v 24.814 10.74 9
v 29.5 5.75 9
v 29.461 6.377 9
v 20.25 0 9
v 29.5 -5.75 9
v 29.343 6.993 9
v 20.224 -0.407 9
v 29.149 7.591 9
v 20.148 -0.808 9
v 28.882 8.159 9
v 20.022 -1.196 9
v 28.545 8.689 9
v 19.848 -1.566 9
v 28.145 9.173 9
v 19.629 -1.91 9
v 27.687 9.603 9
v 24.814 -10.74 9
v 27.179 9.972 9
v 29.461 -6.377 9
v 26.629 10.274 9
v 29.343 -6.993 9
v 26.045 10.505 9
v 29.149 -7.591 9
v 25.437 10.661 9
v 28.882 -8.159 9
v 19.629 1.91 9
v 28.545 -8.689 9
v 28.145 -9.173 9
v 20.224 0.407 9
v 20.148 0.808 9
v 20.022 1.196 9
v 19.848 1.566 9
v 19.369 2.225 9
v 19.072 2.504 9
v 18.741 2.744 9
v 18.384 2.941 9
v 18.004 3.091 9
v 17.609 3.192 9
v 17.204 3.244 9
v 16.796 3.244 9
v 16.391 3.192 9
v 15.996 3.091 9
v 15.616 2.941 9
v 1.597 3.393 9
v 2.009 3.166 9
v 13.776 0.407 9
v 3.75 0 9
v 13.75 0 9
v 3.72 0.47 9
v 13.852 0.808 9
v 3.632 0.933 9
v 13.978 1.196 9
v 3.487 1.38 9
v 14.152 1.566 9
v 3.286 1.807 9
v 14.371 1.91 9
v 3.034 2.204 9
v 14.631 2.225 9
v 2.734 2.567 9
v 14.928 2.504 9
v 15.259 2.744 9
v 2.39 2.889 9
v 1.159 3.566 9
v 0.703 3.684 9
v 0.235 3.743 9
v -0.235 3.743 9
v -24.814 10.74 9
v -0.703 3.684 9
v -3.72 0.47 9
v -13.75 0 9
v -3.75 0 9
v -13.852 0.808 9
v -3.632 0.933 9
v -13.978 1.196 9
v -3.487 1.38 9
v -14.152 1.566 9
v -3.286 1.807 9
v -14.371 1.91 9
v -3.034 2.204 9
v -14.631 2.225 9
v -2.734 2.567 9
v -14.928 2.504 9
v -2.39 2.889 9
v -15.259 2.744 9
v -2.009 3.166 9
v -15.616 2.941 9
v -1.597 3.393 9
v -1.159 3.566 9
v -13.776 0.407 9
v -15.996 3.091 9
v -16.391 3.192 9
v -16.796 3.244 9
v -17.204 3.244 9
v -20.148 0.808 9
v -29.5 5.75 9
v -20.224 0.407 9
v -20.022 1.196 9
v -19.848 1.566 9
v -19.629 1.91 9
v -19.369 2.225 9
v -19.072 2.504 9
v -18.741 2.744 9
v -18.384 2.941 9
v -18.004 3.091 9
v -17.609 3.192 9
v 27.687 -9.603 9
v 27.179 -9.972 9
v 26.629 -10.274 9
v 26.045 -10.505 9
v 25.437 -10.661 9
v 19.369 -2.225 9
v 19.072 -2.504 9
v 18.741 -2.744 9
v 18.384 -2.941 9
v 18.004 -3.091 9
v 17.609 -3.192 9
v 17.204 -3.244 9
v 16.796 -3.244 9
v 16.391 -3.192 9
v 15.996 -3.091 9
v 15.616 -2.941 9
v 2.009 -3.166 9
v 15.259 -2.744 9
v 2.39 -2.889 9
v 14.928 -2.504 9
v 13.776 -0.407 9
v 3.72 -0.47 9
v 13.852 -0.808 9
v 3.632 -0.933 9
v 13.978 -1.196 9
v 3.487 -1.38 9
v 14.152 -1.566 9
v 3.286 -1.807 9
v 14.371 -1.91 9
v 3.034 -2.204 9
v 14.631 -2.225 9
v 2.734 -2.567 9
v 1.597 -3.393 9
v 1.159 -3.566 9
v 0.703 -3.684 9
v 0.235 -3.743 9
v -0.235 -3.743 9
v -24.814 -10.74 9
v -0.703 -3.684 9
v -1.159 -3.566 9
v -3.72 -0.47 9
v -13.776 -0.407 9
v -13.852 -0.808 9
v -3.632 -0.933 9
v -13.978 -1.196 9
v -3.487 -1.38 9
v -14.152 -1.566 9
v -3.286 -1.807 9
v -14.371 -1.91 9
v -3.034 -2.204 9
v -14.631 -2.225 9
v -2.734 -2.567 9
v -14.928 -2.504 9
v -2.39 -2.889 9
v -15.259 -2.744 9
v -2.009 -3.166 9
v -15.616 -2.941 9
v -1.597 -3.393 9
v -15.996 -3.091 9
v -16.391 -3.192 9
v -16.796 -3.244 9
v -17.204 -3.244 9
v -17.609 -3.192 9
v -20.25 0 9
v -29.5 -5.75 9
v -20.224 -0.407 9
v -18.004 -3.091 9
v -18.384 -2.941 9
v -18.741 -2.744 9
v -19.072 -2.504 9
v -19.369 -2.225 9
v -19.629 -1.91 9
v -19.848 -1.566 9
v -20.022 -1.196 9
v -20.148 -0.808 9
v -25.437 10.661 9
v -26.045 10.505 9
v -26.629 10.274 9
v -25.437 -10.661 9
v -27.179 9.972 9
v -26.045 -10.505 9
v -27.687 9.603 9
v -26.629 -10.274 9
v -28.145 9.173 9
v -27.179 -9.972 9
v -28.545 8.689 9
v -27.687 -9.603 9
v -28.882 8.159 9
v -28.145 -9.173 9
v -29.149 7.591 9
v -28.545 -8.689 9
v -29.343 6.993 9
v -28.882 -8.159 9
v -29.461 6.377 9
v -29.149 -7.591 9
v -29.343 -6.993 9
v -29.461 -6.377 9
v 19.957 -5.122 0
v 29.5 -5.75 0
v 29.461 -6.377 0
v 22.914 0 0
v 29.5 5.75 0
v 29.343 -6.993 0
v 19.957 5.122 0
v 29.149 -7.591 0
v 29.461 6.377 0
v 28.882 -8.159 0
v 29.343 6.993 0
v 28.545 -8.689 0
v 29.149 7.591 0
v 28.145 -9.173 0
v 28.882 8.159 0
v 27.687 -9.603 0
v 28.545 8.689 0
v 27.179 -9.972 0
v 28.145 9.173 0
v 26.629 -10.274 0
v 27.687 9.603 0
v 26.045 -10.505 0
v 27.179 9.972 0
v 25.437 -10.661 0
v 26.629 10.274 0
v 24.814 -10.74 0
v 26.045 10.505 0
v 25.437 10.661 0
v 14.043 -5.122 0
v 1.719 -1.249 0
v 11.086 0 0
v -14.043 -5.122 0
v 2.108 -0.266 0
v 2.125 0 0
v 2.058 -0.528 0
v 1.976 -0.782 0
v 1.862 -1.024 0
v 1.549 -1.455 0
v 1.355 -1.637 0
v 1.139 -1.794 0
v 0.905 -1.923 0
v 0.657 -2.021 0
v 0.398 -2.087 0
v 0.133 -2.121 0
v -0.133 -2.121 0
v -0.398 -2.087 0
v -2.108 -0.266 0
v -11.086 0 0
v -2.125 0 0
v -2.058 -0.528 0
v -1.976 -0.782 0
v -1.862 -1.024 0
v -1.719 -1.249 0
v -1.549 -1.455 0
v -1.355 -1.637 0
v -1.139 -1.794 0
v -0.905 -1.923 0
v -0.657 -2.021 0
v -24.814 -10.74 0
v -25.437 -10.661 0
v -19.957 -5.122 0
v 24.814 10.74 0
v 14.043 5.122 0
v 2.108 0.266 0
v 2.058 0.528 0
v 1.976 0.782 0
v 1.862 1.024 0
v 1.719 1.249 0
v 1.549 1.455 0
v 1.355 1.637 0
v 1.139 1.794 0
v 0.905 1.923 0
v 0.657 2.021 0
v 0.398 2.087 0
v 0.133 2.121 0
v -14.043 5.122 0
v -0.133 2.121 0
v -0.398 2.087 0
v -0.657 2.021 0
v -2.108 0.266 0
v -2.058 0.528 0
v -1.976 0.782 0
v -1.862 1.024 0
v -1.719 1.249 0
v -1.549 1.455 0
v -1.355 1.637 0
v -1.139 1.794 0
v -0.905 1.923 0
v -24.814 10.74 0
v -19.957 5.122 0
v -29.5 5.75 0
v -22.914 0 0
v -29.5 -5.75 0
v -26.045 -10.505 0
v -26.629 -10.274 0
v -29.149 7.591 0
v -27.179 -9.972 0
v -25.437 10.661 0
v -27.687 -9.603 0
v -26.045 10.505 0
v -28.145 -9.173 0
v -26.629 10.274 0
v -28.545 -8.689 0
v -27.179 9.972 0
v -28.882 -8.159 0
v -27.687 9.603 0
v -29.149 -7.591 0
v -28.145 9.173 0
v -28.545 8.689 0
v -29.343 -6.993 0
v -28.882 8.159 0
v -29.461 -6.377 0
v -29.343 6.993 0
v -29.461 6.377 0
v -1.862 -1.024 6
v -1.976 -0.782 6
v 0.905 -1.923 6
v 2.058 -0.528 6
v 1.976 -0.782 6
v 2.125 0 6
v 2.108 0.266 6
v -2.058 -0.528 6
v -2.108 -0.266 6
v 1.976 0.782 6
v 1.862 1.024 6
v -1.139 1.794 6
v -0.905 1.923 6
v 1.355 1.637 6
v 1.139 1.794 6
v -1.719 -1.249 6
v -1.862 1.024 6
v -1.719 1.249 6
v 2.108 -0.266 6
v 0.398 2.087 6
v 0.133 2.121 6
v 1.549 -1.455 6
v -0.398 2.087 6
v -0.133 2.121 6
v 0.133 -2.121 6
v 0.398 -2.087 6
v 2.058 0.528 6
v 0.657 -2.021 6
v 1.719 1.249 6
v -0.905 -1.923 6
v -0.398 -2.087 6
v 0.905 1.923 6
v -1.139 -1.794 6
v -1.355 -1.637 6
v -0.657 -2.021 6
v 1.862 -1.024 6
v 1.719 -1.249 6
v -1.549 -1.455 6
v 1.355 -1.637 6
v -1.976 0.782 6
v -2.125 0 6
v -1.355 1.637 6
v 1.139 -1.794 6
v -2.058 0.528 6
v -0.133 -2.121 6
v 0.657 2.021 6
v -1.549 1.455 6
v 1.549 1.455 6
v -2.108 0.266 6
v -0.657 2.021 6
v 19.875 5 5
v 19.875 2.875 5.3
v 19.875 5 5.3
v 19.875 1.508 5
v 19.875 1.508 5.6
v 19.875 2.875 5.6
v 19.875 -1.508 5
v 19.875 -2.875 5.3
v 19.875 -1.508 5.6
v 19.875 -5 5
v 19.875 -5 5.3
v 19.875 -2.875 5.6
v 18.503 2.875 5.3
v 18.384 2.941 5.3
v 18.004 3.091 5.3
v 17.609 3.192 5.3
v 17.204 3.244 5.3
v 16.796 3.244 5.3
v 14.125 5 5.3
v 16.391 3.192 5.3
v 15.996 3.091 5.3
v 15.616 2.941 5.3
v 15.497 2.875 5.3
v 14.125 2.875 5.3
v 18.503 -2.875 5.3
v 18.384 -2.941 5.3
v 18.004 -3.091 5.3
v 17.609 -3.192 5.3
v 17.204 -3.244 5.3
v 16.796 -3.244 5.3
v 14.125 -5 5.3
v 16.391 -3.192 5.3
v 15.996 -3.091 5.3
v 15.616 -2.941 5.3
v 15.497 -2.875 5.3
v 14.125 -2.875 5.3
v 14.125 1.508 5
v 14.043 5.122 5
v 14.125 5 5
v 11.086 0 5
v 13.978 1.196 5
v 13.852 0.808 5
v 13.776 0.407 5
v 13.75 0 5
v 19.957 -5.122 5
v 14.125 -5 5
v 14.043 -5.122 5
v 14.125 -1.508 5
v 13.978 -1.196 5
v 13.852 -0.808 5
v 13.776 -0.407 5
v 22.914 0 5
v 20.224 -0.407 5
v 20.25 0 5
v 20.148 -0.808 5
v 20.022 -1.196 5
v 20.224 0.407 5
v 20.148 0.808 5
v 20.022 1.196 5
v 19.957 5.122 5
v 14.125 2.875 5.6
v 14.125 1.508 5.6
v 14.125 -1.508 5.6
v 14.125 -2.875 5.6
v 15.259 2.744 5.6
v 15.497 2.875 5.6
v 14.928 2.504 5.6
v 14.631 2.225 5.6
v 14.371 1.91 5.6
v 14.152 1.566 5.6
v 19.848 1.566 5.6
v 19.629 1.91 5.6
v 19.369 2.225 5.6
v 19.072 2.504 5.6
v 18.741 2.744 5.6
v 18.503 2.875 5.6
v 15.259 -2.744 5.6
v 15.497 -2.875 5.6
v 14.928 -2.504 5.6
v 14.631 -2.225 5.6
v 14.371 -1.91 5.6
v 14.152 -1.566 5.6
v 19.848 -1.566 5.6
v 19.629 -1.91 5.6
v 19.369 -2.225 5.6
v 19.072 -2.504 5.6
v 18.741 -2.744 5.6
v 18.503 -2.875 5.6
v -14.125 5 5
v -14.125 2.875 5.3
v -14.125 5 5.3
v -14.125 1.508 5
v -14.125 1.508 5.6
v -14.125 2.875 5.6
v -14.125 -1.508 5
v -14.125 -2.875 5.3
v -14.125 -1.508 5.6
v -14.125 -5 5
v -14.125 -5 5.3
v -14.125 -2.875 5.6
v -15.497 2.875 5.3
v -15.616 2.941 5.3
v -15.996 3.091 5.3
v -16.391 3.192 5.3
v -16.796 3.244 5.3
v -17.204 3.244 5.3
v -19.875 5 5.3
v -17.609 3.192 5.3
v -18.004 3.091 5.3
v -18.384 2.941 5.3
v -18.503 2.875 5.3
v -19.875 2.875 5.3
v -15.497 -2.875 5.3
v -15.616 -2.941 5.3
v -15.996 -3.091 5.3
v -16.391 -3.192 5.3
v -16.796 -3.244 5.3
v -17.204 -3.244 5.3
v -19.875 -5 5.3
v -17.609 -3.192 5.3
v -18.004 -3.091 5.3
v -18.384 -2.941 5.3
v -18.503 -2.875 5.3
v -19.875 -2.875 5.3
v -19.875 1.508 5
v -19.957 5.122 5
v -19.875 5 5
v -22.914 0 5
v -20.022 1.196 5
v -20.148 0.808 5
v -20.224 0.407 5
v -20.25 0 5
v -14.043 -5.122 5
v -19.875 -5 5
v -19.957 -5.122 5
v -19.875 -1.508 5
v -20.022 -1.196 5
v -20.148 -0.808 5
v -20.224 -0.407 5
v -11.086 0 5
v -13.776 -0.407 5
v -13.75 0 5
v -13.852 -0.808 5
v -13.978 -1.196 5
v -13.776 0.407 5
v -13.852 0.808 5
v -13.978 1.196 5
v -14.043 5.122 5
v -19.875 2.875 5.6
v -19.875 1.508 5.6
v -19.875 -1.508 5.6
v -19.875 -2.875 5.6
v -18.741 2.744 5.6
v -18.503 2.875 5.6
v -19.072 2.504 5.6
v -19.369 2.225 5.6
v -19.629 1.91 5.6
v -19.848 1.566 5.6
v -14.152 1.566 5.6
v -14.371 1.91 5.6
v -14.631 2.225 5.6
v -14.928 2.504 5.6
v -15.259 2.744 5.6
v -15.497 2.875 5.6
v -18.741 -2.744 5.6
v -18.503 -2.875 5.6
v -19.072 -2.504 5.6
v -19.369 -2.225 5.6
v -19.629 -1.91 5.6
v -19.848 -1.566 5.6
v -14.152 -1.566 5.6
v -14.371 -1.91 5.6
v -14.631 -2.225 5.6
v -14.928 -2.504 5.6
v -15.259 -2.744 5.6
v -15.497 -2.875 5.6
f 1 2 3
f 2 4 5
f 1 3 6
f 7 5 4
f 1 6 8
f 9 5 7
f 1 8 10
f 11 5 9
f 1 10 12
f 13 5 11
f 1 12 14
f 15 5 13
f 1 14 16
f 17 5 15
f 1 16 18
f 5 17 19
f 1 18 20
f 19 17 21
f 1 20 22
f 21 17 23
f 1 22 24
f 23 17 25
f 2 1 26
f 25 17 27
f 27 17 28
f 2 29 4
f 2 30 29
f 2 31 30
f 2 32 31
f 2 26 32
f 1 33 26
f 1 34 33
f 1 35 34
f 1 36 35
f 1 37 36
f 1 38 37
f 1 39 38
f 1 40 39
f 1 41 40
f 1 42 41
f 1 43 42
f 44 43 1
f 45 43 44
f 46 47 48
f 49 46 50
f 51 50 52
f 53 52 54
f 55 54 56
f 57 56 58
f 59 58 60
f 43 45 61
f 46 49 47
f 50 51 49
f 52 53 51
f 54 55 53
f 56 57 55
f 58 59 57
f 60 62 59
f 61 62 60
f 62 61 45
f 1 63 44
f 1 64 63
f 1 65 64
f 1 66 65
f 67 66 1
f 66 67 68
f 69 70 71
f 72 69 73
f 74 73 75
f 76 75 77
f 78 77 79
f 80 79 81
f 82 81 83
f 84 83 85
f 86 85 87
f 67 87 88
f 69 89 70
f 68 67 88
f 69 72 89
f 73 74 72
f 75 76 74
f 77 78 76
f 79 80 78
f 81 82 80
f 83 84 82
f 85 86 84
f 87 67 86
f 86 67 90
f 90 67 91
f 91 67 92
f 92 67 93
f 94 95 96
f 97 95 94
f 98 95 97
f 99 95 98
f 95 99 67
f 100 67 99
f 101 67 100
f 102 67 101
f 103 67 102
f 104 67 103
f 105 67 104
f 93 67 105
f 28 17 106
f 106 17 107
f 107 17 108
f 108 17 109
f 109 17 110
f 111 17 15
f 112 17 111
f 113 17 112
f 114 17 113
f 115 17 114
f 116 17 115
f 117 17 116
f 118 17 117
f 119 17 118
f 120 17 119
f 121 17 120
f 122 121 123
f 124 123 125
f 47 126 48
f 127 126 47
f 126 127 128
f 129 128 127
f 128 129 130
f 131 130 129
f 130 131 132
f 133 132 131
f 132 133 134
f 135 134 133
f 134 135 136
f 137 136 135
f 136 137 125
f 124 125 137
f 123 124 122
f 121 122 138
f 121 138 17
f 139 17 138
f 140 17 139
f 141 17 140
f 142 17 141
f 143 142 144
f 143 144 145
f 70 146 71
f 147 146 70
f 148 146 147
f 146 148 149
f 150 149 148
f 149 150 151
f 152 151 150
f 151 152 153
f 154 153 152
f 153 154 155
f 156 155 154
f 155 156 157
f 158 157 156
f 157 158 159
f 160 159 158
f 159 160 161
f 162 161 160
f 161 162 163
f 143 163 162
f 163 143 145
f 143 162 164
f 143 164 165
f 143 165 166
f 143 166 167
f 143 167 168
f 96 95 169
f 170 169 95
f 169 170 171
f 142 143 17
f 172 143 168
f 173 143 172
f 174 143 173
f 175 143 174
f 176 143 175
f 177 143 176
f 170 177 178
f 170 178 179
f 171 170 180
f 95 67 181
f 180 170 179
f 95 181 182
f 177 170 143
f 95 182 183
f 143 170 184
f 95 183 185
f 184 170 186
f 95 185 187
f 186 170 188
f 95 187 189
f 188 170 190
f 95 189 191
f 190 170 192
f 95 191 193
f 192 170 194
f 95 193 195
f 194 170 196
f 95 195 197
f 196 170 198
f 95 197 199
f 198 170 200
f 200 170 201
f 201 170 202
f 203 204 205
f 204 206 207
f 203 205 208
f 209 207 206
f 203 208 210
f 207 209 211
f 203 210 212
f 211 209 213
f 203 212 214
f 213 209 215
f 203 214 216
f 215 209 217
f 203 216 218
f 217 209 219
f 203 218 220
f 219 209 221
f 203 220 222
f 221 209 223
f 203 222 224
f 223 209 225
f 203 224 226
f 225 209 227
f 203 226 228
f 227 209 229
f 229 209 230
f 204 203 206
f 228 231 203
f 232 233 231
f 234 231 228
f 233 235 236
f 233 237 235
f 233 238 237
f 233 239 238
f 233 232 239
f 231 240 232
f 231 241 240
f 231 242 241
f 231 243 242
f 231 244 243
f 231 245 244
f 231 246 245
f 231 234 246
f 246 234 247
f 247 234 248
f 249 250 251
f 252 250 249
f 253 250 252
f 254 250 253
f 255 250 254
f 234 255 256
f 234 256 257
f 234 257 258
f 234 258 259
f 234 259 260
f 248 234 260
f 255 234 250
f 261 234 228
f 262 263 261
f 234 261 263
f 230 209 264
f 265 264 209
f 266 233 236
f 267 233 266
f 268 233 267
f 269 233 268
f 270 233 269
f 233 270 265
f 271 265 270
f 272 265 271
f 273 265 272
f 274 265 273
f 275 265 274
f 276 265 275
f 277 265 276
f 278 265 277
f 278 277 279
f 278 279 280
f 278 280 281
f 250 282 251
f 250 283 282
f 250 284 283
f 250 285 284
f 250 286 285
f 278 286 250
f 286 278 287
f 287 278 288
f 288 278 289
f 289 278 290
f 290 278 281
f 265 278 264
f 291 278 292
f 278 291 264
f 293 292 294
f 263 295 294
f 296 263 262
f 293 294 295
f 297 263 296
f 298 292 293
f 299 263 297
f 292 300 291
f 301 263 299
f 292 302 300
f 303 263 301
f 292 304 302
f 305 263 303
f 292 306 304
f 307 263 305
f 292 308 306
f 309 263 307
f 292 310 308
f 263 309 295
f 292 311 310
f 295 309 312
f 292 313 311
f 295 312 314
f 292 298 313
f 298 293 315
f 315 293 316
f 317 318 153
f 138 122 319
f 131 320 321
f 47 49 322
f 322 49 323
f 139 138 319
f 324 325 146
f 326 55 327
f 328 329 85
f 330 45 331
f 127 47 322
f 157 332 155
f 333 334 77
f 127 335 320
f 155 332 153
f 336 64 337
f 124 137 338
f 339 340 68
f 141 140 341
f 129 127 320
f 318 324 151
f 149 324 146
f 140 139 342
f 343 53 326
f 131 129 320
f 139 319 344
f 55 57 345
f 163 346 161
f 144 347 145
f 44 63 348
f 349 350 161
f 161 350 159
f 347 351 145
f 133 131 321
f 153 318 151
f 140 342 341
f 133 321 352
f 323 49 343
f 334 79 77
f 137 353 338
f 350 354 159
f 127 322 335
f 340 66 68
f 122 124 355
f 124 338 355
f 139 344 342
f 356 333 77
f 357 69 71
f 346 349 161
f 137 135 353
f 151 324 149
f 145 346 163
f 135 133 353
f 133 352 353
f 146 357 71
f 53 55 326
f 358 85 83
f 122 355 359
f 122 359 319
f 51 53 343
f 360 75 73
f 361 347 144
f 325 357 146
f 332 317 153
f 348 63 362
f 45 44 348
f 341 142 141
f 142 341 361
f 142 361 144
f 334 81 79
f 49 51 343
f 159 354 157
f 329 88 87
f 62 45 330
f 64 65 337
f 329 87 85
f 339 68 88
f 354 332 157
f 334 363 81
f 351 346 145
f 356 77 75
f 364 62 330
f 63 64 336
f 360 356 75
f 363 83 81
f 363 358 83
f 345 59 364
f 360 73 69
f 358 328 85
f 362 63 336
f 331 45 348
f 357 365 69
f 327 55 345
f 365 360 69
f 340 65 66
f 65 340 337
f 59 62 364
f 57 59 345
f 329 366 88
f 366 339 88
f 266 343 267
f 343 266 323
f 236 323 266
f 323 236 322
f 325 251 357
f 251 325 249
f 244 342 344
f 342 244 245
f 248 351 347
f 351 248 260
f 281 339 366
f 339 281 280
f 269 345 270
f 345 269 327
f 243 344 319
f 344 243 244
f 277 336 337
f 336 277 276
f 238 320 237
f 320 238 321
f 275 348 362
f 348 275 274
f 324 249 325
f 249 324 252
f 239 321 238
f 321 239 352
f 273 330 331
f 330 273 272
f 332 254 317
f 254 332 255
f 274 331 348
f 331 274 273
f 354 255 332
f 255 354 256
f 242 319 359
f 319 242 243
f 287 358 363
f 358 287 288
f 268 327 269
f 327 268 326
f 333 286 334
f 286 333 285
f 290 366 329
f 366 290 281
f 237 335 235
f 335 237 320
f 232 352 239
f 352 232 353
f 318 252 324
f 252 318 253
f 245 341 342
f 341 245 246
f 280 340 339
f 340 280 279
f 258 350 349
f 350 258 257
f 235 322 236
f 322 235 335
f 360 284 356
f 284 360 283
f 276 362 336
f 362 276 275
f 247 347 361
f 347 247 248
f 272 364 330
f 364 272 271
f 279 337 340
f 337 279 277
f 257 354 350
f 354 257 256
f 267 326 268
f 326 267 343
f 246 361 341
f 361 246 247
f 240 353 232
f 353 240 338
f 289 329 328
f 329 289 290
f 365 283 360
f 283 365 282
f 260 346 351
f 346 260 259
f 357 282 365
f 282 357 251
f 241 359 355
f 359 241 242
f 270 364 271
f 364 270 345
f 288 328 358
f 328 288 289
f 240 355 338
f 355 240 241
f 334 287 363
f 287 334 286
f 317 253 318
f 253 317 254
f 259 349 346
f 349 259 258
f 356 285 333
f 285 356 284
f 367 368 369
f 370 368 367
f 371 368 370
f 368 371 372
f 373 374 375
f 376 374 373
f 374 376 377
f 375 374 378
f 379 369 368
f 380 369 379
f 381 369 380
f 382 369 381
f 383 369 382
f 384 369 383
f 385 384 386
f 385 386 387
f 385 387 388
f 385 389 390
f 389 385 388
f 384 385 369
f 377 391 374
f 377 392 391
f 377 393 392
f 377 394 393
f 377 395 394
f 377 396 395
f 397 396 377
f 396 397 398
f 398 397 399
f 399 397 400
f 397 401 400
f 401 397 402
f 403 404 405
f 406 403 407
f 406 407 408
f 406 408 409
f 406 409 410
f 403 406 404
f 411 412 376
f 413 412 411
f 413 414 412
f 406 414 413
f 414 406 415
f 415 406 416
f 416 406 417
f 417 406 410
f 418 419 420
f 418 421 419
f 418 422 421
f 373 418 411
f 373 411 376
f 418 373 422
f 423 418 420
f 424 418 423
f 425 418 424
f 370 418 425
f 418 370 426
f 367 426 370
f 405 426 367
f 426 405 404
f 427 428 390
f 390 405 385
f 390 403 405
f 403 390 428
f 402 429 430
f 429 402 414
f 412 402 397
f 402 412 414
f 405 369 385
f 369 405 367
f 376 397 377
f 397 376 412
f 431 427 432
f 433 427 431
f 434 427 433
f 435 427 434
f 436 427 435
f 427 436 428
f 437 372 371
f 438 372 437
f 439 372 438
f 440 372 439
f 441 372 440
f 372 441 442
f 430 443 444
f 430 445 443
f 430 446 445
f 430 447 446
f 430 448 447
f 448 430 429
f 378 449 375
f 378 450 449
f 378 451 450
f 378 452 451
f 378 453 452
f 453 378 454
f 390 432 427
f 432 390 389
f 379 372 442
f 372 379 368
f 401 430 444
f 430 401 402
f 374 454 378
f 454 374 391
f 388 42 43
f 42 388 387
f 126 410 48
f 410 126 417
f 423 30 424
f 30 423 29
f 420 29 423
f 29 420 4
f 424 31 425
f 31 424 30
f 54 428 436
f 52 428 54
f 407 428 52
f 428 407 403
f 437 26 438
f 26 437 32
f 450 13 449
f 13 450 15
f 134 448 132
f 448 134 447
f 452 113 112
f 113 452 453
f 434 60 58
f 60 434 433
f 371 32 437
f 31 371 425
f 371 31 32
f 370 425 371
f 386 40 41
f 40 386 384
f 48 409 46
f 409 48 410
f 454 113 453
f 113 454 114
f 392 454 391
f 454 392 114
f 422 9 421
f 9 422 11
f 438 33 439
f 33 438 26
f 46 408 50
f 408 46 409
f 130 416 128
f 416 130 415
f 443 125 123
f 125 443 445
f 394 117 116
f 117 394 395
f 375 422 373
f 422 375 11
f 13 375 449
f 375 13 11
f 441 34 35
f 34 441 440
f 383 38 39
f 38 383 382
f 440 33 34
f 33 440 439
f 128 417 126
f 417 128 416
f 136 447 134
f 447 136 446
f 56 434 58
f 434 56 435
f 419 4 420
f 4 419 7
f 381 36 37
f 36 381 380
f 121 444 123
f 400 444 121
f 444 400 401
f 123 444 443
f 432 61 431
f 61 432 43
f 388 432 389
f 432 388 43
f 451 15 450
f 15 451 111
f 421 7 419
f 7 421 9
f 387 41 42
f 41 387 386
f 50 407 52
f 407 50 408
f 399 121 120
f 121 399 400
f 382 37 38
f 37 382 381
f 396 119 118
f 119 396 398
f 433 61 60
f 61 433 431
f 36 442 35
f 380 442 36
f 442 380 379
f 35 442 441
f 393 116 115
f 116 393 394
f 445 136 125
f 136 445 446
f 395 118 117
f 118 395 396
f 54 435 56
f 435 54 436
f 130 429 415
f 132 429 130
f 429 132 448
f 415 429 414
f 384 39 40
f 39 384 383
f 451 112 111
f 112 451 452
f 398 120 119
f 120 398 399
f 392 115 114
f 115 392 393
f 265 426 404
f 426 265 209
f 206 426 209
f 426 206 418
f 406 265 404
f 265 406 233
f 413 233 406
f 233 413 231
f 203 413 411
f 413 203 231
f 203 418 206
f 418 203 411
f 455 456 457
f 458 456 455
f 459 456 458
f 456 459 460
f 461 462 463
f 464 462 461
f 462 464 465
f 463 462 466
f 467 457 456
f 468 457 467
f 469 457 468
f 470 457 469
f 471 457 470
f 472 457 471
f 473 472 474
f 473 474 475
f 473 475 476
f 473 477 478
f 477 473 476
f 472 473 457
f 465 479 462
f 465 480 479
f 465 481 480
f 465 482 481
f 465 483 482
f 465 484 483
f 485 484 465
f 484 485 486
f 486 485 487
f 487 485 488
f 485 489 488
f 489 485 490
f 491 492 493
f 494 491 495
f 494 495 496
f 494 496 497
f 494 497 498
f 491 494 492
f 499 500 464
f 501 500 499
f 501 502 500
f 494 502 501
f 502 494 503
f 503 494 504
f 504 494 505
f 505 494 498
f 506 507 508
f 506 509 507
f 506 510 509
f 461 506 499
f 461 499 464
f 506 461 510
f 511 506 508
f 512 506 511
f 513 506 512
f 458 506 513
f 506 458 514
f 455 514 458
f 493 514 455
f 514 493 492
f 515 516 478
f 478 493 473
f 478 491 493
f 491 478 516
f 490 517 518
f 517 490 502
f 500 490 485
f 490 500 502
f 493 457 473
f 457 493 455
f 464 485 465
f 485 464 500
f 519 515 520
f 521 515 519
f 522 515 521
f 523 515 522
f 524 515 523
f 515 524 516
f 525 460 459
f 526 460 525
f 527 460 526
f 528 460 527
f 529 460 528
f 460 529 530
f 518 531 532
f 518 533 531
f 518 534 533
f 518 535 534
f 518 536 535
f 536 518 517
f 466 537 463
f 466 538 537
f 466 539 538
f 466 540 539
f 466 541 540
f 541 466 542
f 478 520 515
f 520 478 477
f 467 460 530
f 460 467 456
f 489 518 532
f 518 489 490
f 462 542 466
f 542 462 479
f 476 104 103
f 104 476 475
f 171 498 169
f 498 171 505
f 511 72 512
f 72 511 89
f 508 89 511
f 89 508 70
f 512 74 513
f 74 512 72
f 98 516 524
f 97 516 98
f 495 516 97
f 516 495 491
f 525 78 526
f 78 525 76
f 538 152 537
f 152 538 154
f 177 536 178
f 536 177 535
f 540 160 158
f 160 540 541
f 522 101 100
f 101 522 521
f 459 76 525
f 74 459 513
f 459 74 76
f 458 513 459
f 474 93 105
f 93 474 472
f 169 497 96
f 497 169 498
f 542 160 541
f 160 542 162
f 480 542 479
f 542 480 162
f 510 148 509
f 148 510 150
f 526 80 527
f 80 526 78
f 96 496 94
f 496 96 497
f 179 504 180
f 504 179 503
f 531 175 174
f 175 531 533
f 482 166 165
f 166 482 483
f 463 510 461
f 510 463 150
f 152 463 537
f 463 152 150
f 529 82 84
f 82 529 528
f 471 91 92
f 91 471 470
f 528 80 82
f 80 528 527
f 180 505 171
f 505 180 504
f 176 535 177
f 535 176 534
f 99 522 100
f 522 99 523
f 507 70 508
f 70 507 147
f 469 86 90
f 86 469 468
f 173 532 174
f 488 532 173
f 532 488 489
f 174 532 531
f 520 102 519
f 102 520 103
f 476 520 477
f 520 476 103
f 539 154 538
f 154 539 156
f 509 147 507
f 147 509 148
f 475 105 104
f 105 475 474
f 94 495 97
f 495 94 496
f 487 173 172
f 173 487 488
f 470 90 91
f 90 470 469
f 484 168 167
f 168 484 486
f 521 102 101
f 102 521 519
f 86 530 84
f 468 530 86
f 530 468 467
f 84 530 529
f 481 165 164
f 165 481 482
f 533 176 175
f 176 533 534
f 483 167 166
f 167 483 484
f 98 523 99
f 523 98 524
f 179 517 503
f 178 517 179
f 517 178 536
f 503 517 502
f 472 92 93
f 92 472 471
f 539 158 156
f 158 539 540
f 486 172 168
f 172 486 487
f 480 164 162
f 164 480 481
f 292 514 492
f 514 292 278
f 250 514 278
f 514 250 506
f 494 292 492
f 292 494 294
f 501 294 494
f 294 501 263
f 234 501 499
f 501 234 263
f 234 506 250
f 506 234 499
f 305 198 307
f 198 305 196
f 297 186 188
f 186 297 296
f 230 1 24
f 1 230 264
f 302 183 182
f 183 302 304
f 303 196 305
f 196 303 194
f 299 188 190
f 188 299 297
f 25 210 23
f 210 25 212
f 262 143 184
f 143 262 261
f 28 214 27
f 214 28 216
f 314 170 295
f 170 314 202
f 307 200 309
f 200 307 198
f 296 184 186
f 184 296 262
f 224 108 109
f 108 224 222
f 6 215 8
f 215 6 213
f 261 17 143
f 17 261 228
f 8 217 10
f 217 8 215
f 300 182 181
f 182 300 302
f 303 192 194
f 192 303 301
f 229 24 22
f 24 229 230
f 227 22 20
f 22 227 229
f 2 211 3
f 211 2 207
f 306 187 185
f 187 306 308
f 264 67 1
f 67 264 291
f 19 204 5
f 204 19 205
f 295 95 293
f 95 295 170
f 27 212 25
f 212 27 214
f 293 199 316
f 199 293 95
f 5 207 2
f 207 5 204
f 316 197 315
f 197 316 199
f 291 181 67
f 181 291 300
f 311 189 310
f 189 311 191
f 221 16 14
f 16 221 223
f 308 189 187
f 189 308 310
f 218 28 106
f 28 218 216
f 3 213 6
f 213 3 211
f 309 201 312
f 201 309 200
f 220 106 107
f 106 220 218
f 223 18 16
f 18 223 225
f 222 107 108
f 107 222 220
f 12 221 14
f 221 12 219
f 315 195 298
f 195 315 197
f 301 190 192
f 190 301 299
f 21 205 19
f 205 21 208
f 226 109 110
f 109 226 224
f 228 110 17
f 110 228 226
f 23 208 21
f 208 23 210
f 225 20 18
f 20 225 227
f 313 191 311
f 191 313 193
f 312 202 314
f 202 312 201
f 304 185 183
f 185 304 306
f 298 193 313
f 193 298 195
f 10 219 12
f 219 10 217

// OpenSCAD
$fn = 50;


difference() {
	union() {
		hull() {
			translate(v = [-24.5000000000, 5.7500000000, 0]) {
				cylinder(h = 9, r = 5);
			}
			translate(v = [24.5000000000, 5.7500000000, 0]) {
				cylinder(h = 9, r = 5);
			}
			translate(v = [-24.5000000000, -5.7500000000, 0]) {
				cylinder(h = 9, r = 5);
			}
			translate(v = [24.5000000000, -5.7500000000, 0]) {
				cylinder(h = 9, r = 5);
			}
		}
	}
	union() {
		translate(v = [0, 0, 9]) {
			rotate(a = [0, 0, 0]) {
				difference() {
					union() {
						#translate(v = [0, 0, -9.0000000000]) {
							cylinder(h = 9, r = 2.0000000000);
						}
						#translate(v = [0, 0, -3]) {
							cylinder(h = 3, r1 = 2.1250000000, r2 = 3.7500000000);
						}
						#translate(v = [0, 0, -9.0000000000]) {
							cylinder(h = 9, r = 2.1250000000);
						}
						#translate(v = [0, 0, -9.0000000000]) {
							cylinder(h = 9, r = 2.0000000000);
						}
					}
					union();
				}
			}
		}
		translate(v = [17.0000000000, 0, 0]) {
			rotate(a = [0, 0, 0]) {
				difference() {
					union() {
						#translate(v = [-2.8750000000, -5.0000000000, -0.3000000000]) {
							cube(size = [5.7500000000, 10, 0.3000000000]);
						}
						#translate(v = [-2.8750000000, -2.8750000000, -0.6000000000]) {
							cube(size = [5.7500000000, 5.7500000000, 0.3000000000]);
						}
						#translate(v = [-2.8750000000, -5.0000000000, 5]) {
							cube(size = [5.7500000000, 10, 0.3000000000]);
						}
						#translate(v = [-2.8750000000, -2.8750000000, 5.3000000000]) {
							cube(size = [5.7500000000, 5.7500000000, 0.3000000000]);
						}
						#translate(v = [0, 0, -100.0000000000]) {
							cylinder(h = 200, r = 3.2500000000);
						}
						#linear_extrude(height = 5) {
							polygon(points = [[5.9142500000, 0.0000000000], [2.9571250000, 5.1218907443], [-2.9571250000, 5.1218907443], [-5.9142500000, 0.0000000000], [-2.9571250000, -5.1218907443], [2.9571250000, -5.1218907443]]);
						}
						#translate(v = [-2.8750000000, -5.0000000000, -0.3000000000]) {
							cube(size = [5.7500000000, 10, 0.3000000000]);
						}
						#translate(v = [-2.8750000000, -2.8750000000, -0.6000000000]) {
							cube(size = [5.7500000000, 5.7500000000, 0.3000000000]);
						}
						#translate(v = [-2.8750000000, -5.0000000000, 5]) {
							cube(size = [5.7500000000, 10, 0.3000000000]);
						}
						#translate(v = [-2.8750000000, -2.8750000000, 5.3000000000]) {
							cube(size = [5.7500000000, 5.7500000000, 0.3000000000]);
						}
						#translate(v = [0, 0, -100.0000000000]) {
							cylinder(h = 200, r = 3.2500000000);
						}
						#translate(v = [-2.8750000000, -5.0000000000, -0.3000000000]) {
							cube(size = [5.7500000000, 10, 0.3000000000]);
						}
						#translate(v = [-2.8750000000, -2.8750000000, -0.6000000000]) {
							cube(size = [5.7500000000, 5.7500000000, 0.3000000000]);
						}
						#translate(v = [-2.8750000000, -5.0000000000, 5]) {
							cube(size = [5.7500000000, 10, 0.3000000000]);
						}
						#translate(v = [-2.8750000000, -2.8750000000, 5.3000000000]) {
							cube(size = [5.7500000000, 5.7500000000, 0.3000000000]);
						}
						#translate(v = [0, 0, -100.0000000000]) {
							cylinder(h = 200, r = 3.2500000000);
						}
					}
					union();
				}
			}
		}
		translate(v = [-17.0000000000, 0, 0]) {
			rotate(a = [0, 0, 0]) {
				difference() {
					union() {
						#translate(v = [-2.8750000000, -5.0000000000, -0.3000000000]) {
							cube(size = [5.7500000000, 10, 0.3000000000]);
						}
						#translate(v = [-2.8750000000, -2.8750000000, -0.6000000000]) {
							cube(size = [5.7500000000, 5.7500000000, 0.3000000000]);
						}
						#translate(v = [-2.8750000000, -5.0000000000, 5]) {
							cube(size = [5.7500000000, 10, 0.3000000000]);
						}
						#translate(v = [-2.8750000000, -2.8750000000, 5.3000000000]) {
							cube(size = [5.7500000000, 5.7500000000, 0.3000000000]);
						}
						#translate(v = [0, 0, -100.0000000000]) {
							cylinder(h = 200, r = 3.2500000000);
						}
						#linear_extrude(height = 5) {
							polygon(points = [[5.9142500000, 0.0000000000], [2.9571250000, 5.1218907443], [-2.9571250000, 5.1218907443], [-5.9142500000, 0.0000000000], [-2.9571250000, -5.1218907443], [2.9571250000, -5.1218907443]]);
						}
						#translate(v = [-2.8750000000, -5.0000000000, -0.3000000000]) {
							cube(size = [5.7500000000, 10, 0.3000000000]);
						}
						#translate(v = [-2.8750000000, -2.8750000000, -0.6000000000]) {
							cube(size = [5.7500000000, 5.7500000000, 0.3000000000]);
						}
						#translate(v = [-2.8750000000, -5.0000000000, 5]) {
							cube(size = [5.7500000000, 10, 0.3000000000]);
						}
						#translate(v = [-2.8750000000, -2.8750000000, 5.3000000000]) {
							cube(size = [5.7500000000, 5.7500000000, 0.3000000000]);
						}
						#translate(v = [0, 0, -100.0000000000]) {
							cylinder(h = 200, r = 3.2500000000);
						}
						#translate(v = [-2.8750000000, -5.0000000000, -0.3000000000]) {
							cube(size = [5.7500000000, 10, 0.3000000000]);
						}
						#translate(v = [-2.8750000000, -2.8750000000, -0.6000000000]) {
							cube(size = [5.7500000000, 5.7500000000, 0.3000000000]);
						}
						#translate(v = [-2.8750000000, -5.0000000000, 5]) {
							cube(size = [5.7500000000, 10, 0.3000000000]);
						}
						#translate(v = [-2.8750000000, -2.8750000000, 5.3000000000]) {
							cube(size = [5.7500000000, 5.7500000000, 0.3000000000]);
						}
						#translate(v = [0, 0, -100.0000000000]) {
							cylinder(h = 200, r = 3.2500000000);
						}
					}
					union();
				}
			}
		}
	}
}
